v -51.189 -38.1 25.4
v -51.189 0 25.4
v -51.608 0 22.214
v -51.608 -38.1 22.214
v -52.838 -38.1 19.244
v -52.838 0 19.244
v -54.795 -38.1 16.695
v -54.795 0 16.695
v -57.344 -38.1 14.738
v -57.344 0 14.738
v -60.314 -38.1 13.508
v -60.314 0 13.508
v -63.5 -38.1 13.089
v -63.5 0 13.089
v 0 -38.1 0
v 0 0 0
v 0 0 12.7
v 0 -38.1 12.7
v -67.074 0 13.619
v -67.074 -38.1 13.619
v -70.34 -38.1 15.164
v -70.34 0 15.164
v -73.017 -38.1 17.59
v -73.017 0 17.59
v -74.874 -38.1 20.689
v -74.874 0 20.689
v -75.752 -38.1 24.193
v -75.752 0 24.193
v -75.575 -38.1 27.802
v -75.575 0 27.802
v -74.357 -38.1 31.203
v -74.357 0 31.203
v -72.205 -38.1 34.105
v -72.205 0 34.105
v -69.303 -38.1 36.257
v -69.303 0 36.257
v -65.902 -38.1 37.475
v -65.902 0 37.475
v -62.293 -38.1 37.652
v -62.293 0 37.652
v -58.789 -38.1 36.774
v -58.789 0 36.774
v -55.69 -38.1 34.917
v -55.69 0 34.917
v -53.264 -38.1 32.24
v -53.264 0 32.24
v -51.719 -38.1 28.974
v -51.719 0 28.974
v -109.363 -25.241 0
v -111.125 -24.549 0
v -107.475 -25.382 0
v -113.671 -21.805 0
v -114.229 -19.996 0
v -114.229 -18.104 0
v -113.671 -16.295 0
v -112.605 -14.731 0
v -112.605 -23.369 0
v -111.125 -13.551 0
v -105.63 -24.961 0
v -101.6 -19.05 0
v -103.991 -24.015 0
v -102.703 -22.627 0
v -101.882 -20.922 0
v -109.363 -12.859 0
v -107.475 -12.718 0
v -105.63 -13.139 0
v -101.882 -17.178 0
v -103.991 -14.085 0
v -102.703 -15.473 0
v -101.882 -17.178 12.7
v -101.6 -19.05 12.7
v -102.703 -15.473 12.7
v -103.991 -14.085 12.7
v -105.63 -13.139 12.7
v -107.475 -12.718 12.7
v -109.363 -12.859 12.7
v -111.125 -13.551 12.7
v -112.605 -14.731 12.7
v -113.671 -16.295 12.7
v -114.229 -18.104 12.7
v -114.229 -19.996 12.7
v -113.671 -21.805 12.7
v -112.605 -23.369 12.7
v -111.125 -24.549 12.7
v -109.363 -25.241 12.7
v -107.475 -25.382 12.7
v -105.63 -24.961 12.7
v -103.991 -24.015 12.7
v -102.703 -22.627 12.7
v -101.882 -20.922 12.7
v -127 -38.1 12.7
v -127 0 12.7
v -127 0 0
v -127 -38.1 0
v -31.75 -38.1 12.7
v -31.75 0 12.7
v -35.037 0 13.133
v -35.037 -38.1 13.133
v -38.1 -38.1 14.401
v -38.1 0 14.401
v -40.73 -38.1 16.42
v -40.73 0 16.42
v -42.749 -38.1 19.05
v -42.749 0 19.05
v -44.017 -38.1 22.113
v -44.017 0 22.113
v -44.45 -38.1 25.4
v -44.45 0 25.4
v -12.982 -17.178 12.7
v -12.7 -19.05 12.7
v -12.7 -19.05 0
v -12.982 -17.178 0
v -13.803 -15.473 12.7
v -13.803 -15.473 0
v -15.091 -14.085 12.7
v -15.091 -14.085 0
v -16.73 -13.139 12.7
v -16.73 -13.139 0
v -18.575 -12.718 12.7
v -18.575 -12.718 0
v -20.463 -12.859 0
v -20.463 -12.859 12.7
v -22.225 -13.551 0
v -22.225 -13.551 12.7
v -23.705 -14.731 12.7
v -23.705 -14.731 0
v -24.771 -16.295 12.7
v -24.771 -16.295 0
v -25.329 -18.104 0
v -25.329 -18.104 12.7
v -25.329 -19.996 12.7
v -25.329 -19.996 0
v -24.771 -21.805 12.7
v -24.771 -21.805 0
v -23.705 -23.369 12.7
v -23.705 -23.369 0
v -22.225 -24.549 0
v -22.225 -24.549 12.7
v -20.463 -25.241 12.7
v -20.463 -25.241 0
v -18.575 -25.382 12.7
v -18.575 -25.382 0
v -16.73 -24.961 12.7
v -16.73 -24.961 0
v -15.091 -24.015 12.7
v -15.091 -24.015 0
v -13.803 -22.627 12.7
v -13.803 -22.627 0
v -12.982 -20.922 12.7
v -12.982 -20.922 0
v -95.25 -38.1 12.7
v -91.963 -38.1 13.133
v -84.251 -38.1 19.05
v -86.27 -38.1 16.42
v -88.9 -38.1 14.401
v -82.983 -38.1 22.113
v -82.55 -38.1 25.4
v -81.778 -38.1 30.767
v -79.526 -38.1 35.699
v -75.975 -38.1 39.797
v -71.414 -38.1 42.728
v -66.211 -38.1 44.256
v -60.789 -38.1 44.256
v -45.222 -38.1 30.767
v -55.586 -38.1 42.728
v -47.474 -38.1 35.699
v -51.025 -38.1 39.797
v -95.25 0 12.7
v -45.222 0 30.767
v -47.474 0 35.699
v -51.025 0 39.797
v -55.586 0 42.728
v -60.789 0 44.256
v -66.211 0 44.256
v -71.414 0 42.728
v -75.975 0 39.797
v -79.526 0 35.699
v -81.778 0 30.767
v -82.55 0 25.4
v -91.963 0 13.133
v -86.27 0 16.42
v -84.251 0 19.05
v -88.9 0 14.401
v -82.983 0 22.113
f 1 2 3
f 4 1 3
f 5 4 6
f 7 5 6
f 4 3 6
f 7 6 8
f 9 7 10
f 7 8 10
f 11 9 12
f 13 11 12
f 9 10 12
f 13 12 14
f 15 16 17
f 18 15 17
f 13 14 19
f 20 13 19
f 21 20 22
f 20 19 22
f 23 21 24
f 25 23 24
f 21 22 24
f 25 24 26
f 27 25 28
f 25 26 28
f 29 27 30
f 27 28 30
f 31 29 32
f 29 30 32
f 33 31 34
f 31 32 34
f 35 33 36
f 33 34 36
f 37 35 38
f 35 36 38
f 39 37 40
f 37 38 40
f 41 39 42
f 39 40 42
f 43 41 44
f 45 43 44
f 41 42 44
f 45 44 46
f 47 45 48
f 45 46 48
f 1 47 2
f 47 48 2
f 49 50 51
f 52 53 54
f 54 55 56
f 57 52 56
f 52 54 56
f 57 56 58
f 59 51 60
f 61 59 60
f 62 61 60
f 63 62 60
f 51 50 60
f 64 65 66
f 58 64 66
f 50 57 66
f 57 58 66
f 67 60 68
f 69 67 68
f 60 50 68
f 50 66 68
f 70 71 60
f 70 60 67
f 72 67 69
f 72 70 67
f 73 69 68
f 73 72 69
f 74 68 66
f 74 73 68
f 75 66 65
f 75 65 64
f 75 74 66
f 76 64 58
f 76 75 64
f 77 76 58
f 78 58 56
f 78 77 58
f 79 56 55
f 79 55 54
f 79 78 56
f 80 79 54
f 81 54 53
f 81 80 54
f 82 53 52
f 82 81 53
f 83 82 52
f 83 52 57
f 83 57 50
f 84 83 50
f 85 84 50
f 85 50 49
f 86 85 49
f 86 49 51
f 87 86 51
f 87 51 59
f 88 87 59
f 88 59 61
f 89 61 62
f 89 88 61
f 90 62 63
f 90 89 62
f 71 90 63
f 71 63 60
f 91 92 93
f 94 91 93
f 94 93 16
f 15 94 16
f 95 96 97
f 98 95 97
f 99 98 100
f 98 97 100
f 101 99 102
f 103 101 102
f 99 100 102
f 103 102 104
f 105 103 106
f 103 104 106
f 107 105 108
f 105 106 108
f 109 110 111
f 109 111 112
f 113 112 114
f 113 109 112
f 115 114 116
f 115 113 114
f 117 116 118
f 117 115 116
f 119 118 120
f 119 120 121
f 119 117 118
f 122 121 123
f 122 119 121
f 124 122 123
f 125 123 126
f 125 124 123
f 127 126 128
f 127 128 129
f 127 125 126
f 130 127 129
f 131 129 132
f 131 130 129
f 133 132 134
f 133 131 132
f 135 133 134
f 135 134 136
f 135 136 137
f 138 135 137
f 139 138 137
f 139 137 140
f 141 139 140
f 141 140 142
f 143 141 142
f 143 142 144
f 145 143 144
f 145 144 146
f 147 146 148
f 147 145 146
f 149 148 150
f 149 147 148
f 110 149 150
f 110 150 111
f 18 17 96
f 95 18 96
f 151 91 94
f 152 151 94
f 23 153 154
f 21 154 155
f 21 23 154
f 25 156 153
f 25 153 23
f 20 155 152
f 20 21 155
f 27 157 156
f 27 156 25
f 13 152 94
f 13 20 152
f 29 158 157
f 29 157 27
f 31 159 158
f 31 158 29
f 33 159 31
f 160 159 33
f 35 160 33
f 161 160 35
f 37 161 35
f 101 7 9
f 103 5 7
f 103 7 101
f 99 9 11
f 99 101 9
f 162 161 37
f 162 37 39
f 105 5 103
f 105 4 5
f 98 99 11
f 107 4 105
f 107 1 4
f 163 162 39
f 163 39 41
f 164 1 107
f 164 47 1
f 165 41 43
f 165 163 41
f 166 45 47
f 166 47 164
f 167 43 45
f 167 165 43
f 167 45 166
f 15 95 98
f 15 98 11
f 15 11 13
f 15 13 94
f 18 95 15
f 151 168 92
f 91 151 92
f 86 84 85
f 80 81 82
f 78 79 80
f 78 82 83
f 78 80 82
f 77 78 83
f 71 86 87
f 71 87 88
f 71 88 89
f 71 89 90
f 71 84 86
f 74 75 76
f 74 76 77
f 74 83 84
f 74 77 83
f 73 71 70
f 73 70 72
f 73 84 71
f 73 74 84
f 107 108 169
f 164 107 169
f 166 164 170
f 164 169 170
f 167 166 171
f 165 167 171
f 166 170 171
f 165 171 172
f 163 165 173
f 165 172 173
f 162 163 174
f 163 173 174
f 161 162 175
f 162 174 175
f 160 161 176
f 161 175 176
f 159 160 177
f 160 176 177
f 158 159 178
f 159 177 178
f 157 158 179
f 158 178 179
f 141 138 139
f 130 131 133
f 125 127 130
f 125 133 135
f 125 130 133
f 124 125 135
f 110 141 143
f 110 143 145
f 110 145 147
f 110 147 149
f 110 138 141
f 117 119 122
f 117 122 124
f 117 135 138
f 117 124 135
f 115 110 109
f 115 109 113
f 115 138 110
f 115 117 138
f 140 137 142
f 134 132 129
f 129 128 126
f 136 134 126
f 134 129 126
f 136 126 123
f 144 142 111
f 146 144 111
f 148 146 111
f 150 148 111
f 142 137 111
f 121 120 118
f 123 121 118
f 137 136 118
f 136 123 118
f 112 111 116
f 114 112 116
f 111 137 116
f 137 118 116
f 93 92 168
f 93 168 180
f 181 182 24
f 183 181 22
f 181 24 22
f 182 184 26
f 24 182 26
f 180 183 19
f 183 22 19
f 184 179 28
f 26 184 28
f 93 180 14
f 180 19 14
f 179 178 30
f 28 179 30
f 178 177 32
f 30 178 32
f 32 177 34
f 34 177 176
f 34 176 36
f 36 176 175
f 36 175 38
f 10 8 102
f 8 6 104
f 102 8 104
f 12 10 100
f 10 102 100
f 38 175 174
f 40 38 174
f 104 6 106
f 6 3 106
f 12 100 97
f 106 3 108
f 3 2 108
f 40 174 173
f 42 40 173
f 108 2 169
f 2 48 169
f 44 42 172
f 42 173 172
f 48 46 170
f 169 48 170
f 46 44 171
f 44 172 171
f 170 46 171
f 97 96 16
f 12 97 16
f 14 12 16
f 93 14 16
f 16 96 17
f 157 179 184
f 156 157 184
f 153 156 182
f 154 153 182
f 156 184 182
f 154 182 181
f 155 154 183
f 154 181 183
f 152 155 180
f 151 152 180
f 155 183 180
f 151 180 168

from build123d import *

# Parameters (mm, degrees)
F1_DEPTH = 38.1
F2_R     = 6.35
F3_DEPTH = 12.7


with BuildPart() as f1:
    # F0 (on Front) → F1 (new body)
    with BuildSketch(Plane.XZ):
        with BuildLine():
            Line((-127, 12.7), (-127, 0))
            Line((-127, 0), (-63.5, 0))
            Line((-63.5, 0), (0, 0))
            Line((0, 0), (0, 12.7))
            Line((0, 12.7), (-24.7968353347, 12.7))
            Line((-24.7968353347, 12.7), (-31.75, 12.7))
            ThreePointArc((-31.75, 12.7), (-40.7302561211, 16.4197438789), (-44.45, 25.4))
            ThreePointArc((-44.45, 25.4), (-63.5, 44.45), (-82.55, 25.4))
            ThreePointArc((-82.55, 25.4), (-86.2697438789, 16.4197438789), (-95.25, 12.7))
            Line((-95.25, 12.7), (-102.2031646653, 12.7))
            Line((-102.2031646653, 12.7), (-127, 12.7))
        make_face()
        with BuildLine():
            ThreePointArc((-51.1888807111, 25.4), (-54.7947240668, 16.6947240668), (-63.5, 13.0888807111))
            ThreePointArc((-63.5, 13.0888807111), (-72.2052759332, 34.1052759332), (-51.1888807111, 25.4))
        make_face(mode=Mode.SUBTRACT)
    extrude(amount=F1_DEPTH)


with BuildPart() as f3:
    # F2 (on face) → F3 (new body, through all)
    with BuildSketch(Plane.XY.offset(12.7)):
        with Locations((-107.95, -19.05)):
            Circle(F2_R)
    extrude(amount=-F3_DEPTH)


with BuildPart() as f3b:
    # F2 (on face) → F3, piece 2 (new body, through all)
    with BuildSketch(Plane.XY.offset(12.7)):
        with Locations((-19.05, -19.05)):
            Circle(F2_R)
    extrude(amount=-F3_DEPTH)


solid = Compound([f1.part, f3.part, f3b.part])
